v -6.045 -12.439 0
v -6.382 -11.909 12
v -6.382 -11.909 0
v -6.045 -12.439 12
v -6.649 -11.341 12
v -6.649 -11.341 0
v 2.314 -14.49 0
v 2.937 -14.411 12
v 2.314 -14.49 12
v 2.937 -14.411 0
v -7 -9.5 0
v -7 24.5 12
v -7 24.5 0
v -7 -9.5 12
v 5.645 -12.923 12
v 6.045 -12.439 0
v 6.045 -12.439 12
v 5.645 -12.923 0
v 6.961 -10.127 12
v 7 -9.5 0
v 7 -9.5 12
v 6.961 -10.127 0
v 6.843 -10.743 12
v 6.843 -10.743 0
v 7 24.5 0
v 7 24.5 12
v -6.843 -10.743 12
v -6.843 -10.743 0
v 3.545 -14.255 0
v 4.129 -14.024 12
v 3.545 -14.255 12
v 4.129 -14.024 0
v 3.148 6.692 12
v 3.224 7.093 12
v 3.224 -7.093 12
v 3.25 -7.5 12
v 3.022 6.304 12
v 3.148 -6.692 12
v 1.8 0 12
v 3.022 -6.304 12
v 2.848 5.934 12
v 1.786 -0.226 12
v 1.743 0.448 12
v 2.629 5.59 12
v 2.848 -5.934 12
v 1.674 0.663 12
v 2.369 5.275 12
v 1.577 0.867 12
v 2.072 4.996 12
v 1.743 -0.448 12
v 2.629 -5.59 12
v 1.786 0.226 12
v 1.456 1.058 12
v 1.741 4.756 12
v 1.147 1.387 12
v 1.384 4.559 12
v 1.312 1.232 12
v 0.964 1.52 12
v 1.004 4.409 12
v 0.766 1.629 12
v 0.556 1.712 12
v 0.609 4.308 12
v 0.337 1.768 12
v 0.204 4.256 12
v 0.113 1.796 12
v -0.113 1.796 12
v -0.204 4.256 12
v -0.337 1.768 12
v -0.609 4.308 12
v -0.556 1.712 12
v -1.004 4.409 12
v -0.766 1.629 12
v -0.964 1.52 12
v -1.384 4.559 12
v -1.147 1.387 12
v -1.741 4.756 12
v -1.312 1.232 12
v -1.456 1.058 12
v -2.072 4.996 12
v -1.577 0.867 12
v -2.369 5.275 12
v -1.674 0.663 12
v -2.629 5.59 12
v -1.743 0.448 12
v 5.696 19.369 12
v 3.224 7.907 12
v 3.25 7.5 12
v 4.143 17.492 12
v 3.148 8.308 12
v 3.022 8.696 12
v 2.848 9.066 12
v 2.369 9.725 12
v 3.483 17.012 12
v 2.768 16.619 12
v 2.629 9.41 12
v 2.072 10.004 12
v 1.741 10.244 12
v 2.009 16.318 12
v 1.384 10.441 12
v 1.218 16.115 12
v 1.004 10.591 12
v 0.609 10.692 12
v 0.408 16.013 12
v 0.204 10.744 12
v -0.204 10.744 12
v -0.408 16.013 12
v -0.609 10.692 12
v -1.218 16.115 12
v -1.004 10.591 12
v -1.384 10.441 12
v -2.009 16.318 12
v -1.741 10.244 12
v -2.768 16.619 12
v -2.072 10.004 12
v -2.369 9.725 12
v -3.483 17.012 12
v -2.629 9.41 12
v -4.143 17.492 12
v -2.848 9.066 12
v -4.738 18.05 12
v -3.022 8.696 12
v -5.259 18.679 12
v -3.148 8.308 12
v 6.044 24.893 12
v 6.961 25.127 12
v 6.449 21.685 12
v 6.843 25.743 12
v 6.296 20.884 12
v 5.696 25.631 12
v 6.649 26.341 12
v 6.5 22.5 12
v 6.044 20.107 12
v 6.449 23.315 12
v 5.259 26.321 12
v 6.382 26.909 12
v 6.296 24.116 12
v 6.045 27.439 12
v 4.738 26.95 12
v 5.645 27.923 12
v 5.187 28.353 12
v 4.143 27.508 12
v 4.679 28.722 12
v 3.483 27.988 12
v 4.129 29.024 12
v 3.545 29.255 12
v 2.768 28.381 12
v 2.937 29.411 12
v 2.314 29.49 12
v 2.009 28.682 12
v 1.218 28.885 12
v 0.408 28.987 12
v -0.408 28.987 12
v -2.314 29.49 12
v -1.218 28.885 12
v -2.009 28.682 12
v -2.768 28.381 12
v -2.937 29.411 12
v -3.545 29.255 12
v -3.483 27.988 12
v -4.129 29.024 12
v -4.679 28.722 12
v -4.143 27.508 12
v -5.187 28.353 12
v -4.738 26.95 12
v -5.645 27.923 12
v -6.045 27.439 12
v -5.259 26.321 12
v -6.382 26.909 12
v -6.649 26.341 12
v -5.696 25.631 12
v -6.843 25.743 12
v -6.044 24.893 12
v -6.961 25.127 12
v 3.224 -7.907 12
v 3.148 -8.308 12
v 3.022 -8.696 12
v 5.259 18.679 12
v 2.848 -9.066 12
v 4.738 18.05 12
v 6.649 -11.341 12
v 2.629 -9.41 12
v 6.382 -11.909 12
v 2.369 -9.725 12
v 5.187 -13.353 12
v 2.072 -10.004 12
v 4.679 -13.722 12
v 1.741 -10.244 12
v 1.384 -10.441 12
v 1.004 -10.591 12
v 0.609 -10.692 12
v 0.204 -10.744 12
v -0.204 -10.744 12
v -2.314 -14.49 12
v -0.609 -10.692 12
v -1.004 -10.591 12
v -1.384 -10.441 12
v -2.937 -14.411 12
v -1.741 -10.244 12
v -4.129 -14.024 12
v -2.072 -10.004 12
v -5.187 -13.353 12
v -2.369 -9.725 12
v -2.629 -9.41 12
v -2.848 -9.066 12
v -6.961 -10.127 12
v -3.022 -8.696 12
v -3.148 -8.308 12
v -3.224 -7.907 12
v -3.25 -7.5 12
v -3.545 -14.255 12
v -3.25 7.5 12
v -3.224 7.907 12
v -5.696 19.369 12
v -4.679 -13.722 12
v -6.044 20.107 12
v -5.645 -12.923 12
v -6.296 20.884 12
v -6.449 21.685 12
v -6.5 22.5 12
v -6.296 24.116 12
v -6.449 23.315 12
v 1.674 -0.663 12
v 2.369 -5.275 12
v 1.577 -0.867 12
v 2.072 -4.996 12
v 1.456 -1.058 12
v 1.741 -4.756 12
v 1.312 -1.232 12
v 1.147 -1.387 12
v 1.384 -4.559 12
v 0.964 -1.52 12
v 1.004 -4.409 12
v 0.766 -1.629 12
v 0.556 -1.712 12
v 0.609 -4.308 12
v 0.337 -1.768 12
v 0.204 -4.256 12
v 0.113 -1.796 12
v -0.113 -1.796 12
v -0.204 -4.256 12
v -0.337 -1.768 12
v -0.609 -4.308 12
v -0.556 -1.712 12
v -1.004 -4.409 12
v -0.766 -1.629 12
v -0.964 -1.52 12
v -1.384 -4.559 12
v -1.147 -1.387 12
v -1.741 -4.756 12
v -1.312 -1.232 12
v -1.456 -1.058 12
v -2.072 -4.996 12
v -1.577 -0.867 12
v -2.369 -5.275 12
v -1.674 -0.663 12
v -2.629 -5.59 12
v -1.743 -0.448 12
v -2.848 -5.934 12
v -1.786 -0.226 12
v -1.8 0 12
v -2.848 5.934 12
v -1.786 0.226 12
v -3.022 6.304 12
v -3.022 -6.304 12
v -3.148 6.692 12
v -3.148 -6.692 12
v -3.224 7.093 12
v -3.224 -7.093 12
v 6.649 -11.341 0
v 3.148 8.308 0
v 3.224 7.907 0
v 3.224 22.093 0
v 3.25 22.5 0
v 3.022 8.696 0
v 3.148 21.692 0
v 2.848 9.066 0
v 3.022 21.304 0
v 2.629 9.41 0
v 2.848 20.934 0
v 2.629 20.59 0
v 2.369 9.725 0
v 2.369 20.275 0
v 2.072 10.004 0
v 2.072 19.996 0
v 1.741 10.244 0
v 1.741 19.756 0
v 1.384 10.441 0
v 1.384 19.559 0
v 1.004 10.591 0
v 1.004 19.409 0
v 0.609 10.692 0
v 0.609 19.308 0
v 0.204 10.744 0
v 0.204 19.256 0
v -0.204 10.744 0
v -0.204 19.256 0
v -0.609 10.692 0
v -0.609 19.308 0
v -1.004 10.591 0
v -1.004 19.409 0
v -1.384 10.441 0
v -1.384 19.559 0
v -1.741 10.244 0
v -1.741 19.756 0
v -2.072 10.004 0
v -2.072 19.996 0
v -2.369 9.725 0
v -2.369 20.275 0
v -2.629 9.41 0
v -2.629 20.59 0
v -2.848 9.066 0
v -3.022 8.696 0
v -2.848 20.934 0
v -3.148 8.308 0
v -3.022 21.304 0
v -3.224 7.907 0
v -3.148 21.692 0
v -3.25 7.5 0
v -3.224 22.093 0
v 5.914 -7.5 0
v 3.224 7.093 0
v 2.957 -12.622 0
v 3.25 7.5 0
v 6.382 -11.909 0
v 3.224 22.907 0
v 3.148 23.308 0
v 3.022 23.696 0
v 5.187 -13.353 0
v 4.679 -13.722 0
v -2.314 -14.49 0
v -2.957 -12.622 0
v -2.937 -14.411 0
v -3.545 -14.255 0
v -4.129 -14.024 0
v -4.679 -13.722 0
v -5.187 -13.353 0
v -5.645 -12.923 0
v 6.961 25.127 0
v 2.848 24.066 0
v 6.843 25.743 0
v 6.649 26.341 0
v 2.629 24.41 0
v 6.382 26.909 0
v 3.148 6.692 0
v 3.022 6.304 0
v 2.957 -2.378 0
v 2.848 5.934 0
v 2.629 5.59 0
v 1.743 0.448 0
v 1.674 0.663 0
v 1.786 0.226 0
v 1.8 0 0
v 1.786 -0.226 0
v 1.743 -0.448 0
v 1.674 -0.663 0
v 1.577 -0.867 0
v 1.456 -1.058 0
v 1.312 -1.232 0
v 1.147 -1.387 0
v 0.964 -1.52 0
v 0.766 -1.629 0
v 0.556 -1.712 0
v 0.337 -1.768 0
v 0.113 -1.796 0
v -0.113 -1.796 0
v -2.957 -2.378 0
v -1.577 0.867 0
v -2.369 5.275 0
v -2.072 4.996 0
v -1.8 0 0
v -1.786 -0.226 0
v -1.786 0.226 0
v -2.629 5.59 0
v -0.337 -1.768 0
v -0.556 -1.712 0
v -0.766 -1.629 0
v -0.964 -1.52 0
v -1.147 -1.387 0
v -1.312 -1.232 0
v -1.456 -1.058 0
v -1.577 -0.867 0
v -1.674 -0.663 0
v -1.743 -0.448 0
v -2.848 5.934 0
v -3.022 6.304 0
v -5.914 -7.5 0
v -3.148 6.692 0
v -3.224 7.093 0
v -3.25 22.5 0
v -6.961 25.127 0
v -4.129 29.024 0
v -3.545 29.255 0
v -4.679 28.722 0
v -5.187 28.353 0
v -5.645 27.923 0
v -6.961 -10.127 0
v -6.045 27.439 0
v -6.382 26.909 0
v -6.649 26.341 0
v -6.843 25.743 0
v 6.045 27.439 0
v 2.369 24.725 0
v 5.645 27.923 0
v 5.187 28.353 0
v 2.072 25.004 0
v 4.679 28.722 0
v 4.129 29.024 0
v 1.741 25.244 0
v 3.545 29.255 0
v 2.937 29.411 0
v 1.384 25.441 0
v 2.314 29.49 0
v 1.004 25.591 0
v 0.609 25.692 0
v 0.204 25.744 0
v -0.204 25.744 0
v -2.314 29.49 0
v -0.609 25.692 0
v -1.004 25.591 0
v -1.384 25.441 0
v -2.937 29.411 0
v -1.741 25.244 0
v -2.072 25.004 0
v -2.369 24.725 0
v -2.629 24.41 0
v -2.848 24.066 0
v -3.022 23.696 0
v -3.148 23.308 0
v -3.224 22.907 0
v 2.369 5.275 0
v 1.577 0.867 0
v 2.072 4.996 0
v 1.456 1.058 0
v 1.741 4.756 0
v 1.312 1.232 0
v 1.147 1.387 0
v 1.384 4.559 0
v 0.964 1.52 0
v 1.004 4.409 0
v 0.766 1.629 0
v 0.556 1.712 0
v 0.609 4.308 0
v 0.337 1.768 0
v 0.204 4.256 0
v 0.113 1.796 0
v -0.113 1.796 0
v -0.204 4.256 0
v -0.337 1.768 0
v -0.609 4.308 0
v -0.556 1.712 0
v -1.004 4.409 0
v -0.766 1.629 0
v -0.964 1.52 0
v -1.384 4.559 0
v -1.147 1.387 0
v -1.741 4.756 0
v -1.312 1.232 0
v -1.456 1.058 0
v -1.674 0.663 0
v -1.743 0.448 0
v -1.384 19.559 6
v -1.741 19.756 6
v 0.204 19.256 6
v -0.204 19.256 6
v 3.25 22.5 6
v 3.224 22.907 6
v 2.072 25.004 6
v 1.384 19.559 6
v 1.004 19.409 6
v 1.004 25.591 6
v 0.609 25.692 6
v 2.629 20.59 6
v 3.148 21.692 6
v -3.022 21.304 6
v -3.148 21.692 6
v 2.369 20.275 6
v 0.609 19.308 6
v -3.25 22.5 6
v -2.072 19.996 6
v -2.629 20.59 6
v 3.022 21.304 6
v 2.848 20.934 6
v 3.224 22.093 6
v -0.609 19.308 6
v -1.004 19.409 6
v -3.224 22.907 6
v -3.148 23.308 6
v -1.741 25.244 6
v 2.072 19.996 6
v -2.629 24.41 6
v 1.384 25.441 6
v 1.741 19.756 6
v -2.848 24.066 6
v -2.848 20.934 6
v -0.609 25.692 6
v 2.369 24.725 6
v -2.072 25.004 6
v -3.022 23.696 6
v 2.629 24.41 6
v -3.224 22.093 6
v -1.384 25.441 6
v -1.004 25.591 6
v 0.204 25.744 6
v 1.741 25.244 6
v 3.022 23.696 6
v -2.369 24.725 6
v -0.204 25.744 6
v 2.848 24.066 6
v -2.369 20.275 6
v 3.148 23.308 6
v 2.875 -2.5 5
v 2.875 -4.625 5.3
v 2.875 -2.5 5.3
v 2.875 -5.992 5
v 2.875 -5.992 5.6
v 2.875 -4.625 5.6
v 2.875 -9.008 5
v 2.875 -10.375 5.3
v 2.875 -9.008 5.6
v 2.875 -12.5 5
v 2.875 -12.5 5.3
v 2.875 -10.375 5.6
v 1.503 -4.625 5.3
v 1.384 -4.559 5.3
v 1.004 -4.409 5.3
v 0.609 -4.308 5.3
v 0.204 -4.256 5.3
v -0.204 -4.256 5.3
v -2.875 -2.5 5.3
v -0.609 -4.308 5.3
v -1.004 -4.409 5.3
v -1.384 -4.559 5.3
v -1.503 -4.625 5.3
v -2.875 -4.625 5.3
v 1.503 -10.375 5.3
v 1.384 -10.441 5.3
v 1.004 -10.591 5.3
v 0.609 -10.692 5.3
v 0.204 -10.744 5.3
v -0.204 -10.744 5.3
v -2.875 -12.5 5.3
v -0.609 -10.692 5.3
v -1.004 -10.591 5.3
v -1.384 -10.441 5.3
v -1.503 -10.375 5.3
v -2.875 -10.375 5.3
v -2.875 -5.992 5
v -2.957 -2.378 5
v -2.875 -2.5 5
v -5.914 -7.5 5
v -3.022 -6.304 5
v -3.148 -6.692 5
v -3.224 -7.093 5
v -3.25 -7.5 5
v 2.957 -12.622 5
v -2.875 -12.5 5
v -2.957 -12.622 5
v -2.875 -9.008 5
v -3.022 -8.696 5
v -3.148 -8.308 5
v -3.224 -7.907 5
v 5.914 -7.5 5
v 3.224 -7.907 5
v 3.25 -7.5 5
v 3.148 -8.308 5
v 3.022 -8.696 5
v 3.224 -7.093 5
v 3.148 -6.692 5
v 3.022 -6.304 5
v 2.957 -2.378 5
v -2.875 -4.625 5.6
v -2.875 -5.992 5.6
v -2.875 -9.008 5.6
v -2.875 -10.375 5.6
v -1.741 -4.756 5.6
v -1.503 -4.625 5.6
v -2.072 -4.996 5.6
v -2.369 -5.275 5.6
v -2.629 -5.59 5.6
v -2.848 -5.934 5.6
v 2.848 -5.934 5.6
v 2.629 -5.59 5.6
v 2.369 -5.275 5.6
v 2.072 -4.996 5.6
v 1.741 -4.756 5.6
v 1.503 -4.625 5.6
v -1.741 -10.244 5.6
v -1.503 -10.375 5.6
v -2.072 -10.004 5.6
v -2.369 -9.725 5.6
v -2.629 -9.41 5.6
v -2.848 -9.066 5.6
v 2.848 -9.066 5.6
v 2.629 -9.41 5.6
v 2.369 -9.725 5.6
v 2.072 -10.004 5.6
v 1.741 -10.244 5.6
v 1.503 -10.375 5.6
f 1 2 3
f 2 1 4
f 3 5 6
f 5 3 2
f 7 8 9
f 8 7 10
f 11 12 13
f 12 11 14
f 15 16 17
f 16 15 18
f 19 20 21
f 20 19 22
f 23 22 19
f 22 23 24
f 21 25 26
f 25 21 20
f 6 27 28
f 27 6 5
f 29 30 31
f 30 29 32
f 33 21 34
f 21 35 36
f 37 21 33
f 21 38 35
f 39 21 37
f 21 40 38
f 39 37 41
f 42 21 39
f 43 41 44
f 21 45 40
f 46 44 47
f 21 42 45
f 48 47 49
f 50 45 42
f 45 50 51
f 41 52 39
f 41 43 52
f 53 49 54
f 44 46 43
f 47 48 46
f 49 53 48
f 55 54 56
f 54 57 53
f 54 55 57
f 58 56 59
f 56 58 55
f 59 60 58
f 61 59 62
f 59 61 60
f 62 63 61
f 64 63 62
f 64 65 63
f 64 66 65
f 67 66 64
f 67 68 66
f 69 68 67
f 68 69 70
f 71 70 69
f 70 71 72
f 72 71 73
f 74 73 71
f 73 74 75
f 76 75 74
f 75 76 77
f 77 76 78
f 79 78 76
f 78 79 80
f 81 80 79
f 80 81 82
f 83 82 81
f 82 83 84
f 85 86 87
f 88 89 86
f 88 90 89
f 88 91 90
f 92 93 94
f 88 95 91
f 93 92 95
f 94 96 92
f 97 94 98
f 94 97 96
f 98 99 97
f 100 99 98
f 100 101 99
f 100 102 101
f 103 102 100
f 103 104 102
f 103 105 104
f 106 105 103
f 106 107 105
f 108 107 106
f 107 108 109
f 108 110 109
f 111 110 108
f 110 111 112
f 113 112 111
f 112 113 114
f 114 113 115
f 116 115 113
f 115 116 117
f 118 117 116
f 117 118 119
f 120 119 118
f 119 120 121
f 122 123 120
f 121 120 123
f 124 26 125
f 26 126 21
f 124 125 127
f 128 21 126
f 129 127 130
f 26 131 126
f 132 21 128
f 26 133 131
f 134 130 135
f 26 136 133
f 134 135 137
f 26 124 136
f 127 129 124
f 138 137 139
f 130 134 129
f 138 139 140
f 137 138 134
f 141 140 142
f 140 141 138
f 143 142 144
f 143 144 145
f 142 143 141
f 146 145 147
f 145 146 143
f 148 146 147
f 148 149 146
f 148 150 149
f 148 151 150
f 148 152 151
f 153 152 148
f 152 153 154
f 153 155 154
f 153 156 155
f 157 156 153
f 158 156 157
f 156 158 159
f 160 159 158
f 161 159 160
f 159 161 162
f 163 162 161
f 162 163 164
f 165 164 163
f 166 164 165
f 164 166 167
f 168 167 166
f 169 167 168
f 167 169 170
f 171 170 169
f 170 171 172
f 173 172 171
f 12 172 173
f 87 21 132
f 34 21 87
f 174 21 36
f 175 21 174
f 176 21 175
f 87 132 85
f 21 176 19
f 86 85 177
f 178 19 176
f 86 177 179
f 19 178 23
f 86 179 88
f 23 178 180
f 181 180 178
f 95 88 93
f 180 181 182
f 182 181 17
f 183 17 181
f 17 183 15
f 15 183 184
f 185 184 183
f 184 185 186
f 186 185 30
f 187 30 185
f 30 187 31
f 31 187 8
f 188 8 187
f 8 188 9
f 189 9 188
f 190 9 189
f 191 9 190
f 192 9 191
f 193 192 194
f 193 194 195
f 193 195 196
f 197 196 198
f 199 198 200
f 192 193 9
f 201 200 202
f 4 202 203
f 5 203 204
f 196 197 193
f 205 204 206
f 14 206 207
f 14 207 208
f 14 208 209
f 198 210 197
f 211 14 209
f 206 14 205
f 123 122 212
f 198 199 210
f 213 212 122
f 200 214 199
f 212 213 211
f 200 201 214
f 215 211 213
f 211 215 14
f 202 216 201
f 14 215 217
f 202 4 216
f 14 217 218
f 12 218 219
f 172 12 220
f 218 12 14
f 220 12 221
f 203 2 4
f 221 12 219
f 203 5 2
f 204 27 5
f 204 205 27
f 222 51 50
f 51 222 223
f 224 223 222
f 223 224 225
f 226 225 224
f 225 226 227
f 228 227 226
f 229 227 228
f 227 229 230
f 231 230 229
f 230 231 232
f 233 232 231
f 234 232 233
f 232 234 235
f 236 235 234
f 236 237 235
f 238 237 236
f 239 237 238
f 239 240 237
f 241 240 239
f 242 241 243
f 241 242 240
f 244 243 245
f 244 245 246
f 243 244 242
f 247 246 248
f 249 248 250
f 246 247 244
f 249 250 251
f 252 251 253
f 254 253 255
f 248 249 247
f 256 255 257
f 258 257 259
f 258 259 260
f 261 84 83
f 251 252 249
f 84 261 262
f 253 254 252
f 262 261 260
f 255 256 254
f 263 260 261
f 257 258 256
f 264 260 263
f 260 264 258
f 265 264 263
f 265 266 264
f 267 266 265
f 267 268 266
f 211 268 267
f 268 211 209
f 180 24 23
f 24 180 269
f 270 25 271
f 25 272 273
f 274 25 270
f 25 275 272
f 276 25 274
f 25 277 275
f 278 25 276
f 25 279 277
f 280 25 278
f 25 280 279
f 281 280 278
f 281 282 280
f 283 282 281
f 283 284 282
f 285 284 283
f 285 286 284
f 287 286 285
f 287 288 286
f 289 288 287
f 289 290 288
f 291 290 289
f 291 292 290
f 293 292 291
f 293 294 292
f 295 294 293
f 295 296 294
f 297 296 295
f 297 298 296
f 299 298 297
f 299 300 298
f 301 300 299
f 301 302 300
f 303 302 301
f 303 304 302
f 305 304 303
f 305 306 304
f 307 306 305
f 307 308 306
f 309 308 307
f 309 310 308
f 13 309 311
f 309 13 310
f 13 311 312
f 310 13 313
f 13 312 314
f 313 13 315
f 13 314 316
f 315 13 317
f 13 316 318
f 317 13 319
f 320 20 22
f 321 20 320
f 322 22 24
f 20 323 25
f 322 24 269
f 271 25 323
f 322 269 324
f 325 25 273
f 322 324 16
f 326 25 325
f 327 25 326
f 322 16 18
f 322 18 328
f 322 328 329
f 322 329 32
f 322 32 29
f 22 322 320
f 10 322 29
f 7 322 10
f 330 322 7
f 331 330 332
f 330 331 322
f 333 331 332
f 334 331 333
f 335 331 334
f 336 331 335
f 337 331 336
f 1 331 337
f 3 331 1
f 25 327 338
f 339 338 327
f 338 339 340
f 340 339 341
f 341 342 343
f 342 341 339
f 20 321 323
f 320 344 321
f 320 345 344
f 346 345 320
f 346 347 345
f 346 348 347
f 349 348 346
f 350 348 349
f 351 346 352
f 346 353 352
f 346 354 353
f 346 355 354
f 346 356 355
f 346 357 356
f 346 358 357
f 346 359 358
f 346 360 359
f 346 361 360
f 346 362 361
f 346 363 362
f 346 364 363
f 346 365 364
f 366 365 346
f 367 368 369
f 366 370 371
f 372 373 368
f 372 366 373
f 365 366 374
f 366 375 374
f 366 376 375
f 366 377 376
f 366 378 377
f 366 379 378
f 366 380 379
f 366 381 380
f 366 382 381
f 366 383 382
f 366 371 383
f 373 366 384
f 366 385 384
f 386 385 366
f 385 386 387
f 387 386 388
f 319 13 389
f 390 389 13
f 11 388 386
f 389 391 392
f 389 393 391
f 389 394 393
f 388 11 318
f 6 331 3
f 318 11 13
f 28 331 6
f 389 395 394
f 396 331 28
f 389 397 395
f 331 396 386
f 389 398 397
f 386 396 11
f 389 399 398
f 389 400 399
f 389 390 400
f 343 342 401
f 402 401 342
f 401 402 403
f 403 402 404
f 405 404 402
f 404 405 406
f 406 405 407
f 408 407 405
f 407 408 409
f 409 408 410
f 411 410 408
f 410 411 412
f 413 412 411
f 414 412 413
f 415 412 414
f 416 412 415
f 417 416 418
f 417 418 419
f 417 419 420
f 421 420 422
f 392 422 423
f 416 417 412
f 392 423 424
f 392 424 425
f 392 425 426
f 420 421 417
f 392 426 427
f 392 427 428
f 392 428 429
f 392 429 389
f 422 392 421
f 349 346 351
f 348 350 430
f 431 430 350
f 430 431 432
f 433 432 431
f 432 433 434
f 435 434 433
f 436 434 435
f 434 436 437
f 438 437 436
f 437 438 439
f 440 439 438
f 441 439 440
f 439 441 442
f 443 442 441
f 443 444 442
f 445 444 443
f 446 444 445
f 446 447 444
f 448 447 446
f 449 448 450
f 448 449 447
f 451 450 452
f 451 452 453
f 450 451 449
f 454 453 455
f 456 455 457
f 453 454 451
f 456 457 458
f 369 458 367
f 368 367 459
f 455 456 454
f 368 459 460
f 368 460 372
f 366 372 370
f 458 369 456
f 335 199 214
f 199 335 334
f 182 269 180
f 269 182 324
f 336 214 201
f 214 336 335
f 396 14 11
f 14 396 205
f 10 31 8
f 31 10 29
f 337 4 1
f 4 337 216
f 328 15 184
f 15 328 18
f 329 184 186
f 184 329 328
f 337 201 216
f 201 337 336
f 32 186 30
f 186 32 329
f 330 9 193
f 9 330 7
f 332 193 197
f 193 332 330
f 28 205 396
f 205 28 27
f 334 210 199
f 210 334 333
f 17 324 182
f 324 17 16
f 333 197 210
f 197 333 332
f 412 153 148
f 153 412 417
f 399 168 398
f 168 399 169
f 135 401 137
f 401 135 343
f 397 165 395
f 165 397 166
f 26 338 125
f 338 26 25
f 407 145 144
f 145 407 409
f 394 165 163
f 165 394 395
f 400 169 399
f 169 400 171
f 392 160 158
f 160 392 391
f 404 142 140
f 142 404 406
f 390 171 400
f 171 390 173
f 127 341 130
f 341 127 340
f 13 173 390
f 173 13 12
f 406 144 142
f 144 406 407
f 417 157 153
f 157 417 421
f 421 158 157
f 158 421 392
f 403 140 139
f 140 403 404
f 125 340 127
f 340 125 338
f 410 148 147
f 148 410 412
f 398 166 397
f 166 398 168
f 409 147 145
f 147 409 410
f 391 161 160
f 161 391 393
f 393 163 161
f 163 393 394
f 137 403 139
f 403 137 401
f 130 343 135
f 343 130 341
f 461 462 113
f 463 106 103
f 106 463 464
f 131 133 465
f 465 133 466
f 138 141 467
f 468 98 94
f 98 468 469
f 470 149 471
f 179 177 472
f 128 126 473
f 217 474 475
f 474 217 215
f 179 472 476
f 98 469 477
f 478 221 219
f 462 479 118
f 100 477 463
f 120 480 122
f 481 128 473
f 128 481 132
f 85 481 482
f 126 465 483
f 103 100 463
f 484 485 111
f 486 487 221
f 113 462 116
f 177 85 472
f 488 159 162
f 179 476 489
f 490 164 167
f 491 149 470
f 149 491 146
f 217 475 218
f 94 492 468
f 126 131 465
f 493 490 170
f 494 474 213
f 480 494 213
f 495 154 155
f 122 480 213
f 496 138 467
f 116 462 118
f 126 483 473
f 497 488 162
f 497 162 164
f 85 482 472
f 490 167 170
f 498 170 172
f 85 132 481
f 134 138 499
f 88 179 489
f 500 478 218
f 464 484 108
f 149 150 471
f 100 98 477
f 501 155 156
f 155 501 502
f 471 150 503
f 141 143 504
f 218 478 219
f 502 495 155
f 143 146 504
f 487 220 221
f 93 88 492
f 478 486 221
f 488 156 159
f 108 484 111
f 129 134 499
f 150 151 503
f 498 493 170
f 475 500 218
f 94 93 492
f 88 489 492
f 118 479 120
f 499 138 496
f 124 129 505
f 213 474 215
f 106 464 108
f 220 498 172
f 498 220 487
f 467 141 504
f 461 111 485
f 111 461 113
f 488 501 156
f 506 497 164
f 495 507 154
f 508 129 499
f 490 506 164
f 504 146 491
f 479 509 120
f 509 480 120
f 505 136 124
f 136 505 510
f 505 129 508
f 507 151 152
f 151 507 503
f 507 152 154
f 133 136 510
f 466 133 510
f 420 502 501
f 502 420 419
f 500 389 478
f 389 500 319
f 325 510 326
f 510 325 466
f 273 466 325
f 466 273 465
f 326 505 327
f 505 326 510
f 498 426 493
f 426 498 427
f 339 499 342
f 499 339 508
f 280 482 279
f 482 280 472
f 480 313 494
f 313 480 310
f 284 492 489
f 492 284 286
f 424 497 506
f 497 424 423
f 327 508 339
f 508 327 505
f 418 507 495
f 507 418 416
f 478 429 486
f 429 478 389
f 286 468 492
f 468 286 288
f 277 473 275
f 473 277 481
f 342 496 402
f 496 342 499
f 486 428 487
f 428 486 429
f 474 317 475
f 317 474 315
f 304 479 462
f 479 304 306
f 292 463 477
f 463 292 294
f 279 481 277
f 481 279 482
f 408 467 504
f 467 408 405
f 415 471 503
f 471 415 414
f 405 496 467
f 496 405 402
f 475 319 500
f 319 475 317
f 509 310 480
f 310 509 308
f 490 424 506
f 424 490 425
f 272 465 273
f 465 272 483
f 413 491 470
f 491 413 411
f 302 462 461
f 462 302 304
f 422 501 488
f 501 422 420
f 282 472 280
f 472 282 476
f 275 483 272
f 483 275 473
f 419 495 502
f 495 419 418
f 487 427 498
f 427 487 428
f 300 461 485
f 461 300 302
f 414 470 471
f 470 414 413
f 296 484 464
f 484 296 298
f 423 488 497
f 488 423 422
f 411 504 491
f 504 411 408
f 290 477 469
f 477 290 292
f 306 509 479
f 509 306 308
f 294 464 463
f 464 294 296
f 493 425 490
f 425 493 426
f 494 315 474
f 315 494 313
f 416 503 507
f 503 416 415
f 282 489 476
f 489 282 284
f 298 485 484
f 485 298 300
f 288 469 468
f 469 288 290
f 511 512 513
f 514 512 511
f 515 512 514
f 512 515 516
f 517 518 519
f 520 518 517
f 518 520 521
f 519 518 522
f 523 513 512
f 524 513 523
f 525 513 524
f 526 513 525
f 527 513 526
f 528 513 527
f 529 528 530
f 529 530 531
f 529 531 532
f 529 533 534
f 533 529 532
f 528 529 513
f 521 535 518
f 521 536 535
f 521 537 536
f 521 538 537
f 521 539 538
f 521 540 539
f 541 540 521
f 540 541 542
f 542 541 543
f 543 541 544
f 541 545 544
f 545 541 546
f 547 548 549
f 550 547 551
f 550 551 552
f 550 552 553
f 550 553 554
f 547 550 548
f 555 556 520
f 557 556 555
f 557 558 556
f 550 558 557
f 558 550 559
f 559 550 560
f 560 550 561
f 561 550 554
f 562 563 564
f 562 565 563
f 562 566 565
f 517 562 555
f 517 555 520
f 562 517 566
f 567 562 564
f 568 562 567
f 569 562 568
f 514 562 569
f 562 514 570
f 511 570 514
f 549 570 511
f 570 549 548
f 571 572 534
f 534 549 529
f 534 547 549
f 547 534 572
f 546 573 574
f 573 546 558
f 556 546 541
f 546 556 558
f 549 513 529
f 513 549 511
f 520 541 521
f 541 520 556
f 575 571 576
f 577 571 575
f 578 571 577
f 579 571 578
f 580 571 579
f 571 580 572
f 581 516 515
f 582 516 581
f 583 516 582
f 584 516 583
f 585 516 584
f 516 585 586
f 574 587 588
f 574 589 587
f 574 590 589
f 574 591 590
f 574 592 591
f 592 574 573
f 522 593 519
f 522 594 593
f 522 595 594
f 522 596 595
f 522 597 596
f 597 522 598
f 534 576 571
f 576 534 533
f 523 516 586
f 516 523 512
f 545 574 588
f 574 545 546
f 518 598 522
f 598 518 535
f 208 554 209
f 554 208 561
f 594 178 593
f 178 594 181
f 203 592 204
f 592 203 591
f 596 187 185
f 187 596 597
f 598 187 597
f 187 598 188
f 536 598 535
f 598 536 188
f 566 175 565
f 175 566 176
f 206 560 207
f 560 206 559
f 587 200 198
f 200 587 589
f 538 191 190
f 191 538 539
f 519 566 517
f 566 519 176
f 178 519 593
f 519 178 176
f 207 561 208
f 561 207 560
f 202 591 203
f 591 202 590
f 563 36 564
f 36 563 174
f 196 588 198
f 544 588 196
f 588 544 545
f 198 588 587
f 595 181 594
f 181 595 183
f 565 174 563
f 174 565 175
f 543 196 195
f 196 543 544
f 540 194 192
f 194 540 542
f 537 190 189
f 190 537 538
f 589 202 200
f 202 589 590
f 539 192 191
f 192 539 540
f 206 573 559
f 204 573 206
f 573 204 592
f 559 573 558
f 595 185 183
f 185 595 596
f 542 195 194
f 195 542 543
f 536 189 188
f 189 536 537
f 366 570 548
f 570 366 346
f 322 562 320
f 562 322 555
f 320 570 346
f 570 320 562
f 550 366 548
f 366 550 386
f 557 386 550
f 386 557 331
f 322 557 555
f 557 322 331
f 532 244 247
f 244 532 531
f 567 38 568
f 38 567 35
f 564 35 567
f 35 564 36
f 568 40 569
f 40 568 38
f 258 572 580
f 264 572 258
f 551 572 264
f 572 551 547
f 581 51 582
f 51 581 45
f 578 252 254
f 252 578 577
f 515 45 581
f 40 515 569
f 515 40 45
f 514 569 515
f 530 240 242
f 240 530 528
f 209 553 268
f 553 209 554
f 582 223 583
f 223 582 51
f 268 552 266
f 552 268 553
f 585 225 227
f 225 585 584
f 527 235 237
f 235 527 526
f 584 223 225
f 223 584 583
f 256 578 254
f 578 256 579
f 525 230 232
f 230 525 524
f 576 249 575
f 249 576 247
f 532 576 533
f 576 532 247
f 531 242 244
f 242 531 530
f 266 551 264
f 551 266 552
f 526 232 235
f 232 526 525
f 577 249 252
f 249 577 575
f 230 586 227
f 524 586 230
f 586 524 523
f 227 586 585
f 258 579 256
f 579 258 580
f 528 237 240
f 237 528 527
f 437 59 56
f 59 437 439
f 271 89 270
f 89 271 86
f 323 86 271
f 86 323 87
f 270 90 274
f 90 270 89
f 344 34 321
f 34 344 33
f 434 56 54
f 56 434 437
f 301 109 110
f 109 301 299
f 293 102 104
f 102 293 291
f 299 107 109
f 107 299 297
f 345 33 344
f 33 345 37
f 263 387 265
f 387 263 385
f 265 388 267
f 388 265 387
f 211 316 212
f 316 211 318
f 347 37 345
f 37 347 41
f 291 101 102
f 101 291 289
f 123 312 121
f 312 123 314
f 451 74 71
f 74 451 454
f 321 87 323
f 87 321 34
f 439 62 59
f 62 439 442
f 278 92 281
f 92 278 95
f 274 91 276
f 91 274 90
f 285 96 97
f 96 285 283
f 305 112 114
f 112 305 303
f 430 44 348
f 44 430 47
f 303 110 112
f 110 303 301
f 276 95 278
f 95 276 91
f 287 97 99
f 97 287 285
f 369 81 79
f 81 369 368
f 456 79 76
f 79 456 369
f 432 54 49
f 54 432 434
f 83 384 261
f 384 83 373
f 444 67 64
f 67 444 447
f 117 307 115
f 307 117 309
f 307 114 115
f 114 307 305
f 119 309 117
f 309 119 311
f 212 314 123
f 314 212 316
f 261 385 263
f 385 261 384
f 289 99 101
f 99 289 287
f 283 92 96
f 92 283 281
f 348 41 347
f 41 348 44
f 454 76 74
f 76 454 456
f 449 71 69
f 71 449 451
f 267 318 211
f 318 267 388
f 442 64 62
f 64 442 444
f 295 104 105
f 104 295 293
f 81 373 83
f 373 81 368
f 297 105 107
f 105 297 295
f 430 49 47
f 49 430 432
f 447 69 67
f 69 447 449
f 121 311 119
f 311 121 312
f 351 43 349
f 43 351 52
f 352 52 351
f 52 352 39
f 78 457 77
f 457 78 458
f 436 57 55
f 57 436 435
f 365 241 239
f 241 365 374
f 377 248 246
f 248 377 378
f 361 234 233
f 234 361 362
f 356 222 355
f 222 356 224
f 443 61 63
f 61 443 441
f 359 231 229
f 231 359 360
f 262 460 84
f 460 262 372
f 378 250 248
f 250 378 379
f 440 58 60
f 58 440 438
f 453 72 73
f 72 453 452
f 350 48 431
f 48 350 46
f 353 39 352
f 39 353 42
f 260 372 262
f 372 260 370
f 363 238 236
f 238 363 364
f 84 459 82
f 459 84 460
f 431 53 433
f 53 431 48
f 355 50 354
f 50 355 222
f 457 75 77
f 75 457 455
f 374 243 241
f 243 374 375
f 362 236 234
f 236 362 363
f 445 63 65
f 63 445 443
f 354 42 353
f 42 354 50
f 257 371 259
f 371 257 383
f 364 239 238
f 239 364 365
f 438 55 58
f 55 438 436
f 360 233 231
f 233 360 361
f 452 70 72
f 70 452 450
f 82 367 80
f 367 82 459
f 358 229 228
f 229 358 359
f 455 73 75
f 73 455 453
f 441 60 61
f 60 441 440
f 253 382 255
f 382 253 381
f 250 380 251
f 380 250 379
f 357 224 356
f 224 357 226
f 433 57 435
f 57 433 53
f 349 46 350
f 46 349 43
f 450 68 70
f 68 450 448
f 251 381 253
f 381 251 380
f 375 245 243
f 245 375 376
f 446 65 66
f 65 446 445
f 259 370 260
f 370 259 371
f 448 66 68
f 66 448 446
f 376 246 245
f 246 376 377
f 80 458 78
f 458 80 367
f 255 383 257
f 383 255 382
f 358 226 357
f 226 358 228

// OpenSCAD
$fn = 50;


difference() {
	union() {
		hull() {
			translate(v = [-2.0000000000, 9.5000000000, 0]) {
				cylinder(h = 12, r = 5);
			}
			translate(v = [2.0000000000, 9.5000000000, 0]) {
				cylinder(h = 12, r = 5);
			}
			translate(v = [-2.0000000000, -9.5000000000, 0]) {
				cylinder(h = 12, r = 5);
			}
			translate(v = [2.0000000000, -9.5000000000, 0]) {
				cylinder(h = 12, r = 5);
			}
		}
		translate(v = [0.0000000000, 15.0000000000, 0]) {
			hull() {
				translate(v = [-2.0000000000, 9.5000000000, 0]) {
					cylinder(h = 12, r = 5);
				}
				translate(v = [2.0000000000, 9.5000000000, 0]) {
					cylinder(h = 12, r = 5);
				}
				translate(v = [-2.0000000000, -9.5000000000, 0]) {
					cylinder(h = 12, r = 5);
				}
				translate(v = [2.0000000000, -9.5000000000, 0]) {
					cylinder(h = 12, r = 5);
				}
			}
		}
		translate(v = [0.0000000000, 15.0000000000, 0]) {
			hull() {
				translate(v = [-2.0000000000, 9.5000000000, 0]) {
					cylinder(h = 12, r = 5);
				}
				translate(v = [2.0000000000, 9.5000000000, 0]) {
					cylinder(h = 12, r = 5);
				}
				translate(v = [-2.0000000000, -9.5000000000, 0]) {
					cylinder(h = 12, r = 5);
				}
				translate(v = [2.0000000000, -9.5000000000, 0]) {
					cylinder(h = 12, r = 5);
				}
			}
		}
	}
	union() {
		translate(v = [0.0000000000, 22.5000000000, 12]) {
			rotate(a = [0, 0, 0]) {
				difference() {
					union() {
						#translate(v = [0, 0, -12.0000000000]) {
							cylinder(h = 12, r = 2.2500000000);
						}
						#translate(v = [0, 0, -6]) {
							cylinder(h = 6, r1 = 3.2500000000, r2 = 6.5000000000);
						}
						#translate(v = [0, 0, -12.0000000000]) {
							cylinder(h = 12, r = 3.2500000000);
						}
						#translate(v = [0, 0, -12.0000000000]) {
							cylinder(h = 12, r = 2.2500000000);
						}
					}
					union();
				}
			}
		}
		translate(v = [0.0000000000, 22.5000000000, 12]) {
			rotate(a = [0, 0, 0]) {
				difference() {
					union() {
						#translate(v = [0, 0, -12.0000000000]) {
							cylinder(h = 12, r = 2.2500000000);
						}
						#translate(v = [0, 0, -6]) {
							cylinder(h = 6, r1 = 3.2500000000, r2 = 6.5000000000);
						}
						#translate(v = [0, 0, -12.0000000000]) {
							cylinder(h = 12, r = 3.2500000000);
						}
						#translate(v = [0, 0, -12.0000000000]) {
							cylinder(h = 12, r = 2.2500000000);
						}
					}
					union();
				}
			}
		}
		translate(v = [0.0000000000, -7.5000000000, 0]) {
			rotate(a = [0, 0, 0]) {
				difference() {
					union() {
						#translate(v = [-2.8750000000, -5.0000000000, -0.3000000000]) {
							cube(size = [5.7500000000, 10, 0.3000000000]);
						}
						#translate(v = [-2.8750000000, -2.8750000000, -0.6000000000]) {
							cube(size = [5.7500000000, 5.7500000000, 0.3000000000]);
						}
						#translate(v = [-2.8750000000, -5.0000000000, 5]) {
							cube(size = [5.7500000000, 10, 0.3000000000]);
						}
						#translate(v = [-2.8750000000, -2.8750000000, 5.3000000000]) {
							cube(size = [5.7500000000, 5.7500000000, 0.3000000000]);
						}
						#translate(v = [0, 0, -100.0000000000]) {
							cylinder(h = 200, r = 3.2500000000);
						}
						#linear_extrude(height = 5) {
							polygon(points = [[5.9142500000, 0.0000000000], [2.9571250000, 5.1218907443], [-2.9571250000, 5.1218907443], [-5.9142500000, 0.0000000000], [-2.9571250000, -5.1218907443], [2.9571250000, -5.1218907443]]);
						}
						#translate(v = [-2.8750000000, -5.0000000000, -0.3000000000]) {
							cube(size = [5.7500000000, 10, 0.3000000000]);
						}
						#translate(v = [-2.8750000000, -2.8750000000, -0.6000000000]) {
							cube(size = [5.7500000000, 5.7500000000, 0.3000000000]);
						}
						#translate(v = [-2.8750000000, -5.0000000000, 5]) {
							cube(size = [5.7500000000, 10, 0.3000000000]);
						}
						#translate(v = [-2.8750000000, -2.8750000000, 5.3000000000]) {
							cube(size = [5.7500000000, 5.7500000000, 0.3000000000]);
						}
						#translate(v = [0, 0, -100.0000000000]) {
							cylinder(h = 200, r = 3.2500000000);
						}
						#translate(v = [-2.8750000000, -5.0000000000, -0.3000000000]) {
							cube(size = [5.7500000000, 10, 0.3000000000]);
						}
						#translate(v = [-2.8750000000, -2.8750000000, -0.6000000000]) {
							cube(size = [5.7500000000, 5.7500000000, 0.3000000000]);
						}
						#translate(v = [-2.8750000000, -5.0000000000, 5]) {
							cube(size = [5.7500000000, 10, 0.3000000000]);
						}
						#translate(v = [-2.8750000000, -2.8750000000, 5.3000000000]) {
							cube(size = [5.7500000000, 5.7500000000, 0.3000000000]);
						}
						#translate(v = [0, 0, -100.0000000000]) {
							cylinder(h = 200, r = 3.2500000000);
						}
					}
					union();
				}
			}
		}
		translate(v = [0.0000000000, -7.5000000000, 0]) {
			translate(v = [0, 0, -100]) {
				cylinder(h = 200, r = 3.2500000000);
			}
		}
		translate(v = [0.0000000000, 7.5000000000, 0]) {
			translate(v = [0, 0, -100]) {
				cylinder(h = 200, r = 3.2500000000);
			}
		}
		translate(v = [0.0000000000, -7.5000000000, 0]) {
			translate(v = [0, 0, -100]) {
				cylinder(h = 200, r = 1.8000000000);
			}
		}
		translate(v = [0, 0, -100]) {
			cylinder(h = 200, r = 1.8000000000);
		}
		translate(v = [0.0000000000, 7.5000000000, 0]) {
			translate(v = [0, 0, -100]) {
				cylinder(h = 200, r = 1.8000000000);
			}
		}
	}
}
